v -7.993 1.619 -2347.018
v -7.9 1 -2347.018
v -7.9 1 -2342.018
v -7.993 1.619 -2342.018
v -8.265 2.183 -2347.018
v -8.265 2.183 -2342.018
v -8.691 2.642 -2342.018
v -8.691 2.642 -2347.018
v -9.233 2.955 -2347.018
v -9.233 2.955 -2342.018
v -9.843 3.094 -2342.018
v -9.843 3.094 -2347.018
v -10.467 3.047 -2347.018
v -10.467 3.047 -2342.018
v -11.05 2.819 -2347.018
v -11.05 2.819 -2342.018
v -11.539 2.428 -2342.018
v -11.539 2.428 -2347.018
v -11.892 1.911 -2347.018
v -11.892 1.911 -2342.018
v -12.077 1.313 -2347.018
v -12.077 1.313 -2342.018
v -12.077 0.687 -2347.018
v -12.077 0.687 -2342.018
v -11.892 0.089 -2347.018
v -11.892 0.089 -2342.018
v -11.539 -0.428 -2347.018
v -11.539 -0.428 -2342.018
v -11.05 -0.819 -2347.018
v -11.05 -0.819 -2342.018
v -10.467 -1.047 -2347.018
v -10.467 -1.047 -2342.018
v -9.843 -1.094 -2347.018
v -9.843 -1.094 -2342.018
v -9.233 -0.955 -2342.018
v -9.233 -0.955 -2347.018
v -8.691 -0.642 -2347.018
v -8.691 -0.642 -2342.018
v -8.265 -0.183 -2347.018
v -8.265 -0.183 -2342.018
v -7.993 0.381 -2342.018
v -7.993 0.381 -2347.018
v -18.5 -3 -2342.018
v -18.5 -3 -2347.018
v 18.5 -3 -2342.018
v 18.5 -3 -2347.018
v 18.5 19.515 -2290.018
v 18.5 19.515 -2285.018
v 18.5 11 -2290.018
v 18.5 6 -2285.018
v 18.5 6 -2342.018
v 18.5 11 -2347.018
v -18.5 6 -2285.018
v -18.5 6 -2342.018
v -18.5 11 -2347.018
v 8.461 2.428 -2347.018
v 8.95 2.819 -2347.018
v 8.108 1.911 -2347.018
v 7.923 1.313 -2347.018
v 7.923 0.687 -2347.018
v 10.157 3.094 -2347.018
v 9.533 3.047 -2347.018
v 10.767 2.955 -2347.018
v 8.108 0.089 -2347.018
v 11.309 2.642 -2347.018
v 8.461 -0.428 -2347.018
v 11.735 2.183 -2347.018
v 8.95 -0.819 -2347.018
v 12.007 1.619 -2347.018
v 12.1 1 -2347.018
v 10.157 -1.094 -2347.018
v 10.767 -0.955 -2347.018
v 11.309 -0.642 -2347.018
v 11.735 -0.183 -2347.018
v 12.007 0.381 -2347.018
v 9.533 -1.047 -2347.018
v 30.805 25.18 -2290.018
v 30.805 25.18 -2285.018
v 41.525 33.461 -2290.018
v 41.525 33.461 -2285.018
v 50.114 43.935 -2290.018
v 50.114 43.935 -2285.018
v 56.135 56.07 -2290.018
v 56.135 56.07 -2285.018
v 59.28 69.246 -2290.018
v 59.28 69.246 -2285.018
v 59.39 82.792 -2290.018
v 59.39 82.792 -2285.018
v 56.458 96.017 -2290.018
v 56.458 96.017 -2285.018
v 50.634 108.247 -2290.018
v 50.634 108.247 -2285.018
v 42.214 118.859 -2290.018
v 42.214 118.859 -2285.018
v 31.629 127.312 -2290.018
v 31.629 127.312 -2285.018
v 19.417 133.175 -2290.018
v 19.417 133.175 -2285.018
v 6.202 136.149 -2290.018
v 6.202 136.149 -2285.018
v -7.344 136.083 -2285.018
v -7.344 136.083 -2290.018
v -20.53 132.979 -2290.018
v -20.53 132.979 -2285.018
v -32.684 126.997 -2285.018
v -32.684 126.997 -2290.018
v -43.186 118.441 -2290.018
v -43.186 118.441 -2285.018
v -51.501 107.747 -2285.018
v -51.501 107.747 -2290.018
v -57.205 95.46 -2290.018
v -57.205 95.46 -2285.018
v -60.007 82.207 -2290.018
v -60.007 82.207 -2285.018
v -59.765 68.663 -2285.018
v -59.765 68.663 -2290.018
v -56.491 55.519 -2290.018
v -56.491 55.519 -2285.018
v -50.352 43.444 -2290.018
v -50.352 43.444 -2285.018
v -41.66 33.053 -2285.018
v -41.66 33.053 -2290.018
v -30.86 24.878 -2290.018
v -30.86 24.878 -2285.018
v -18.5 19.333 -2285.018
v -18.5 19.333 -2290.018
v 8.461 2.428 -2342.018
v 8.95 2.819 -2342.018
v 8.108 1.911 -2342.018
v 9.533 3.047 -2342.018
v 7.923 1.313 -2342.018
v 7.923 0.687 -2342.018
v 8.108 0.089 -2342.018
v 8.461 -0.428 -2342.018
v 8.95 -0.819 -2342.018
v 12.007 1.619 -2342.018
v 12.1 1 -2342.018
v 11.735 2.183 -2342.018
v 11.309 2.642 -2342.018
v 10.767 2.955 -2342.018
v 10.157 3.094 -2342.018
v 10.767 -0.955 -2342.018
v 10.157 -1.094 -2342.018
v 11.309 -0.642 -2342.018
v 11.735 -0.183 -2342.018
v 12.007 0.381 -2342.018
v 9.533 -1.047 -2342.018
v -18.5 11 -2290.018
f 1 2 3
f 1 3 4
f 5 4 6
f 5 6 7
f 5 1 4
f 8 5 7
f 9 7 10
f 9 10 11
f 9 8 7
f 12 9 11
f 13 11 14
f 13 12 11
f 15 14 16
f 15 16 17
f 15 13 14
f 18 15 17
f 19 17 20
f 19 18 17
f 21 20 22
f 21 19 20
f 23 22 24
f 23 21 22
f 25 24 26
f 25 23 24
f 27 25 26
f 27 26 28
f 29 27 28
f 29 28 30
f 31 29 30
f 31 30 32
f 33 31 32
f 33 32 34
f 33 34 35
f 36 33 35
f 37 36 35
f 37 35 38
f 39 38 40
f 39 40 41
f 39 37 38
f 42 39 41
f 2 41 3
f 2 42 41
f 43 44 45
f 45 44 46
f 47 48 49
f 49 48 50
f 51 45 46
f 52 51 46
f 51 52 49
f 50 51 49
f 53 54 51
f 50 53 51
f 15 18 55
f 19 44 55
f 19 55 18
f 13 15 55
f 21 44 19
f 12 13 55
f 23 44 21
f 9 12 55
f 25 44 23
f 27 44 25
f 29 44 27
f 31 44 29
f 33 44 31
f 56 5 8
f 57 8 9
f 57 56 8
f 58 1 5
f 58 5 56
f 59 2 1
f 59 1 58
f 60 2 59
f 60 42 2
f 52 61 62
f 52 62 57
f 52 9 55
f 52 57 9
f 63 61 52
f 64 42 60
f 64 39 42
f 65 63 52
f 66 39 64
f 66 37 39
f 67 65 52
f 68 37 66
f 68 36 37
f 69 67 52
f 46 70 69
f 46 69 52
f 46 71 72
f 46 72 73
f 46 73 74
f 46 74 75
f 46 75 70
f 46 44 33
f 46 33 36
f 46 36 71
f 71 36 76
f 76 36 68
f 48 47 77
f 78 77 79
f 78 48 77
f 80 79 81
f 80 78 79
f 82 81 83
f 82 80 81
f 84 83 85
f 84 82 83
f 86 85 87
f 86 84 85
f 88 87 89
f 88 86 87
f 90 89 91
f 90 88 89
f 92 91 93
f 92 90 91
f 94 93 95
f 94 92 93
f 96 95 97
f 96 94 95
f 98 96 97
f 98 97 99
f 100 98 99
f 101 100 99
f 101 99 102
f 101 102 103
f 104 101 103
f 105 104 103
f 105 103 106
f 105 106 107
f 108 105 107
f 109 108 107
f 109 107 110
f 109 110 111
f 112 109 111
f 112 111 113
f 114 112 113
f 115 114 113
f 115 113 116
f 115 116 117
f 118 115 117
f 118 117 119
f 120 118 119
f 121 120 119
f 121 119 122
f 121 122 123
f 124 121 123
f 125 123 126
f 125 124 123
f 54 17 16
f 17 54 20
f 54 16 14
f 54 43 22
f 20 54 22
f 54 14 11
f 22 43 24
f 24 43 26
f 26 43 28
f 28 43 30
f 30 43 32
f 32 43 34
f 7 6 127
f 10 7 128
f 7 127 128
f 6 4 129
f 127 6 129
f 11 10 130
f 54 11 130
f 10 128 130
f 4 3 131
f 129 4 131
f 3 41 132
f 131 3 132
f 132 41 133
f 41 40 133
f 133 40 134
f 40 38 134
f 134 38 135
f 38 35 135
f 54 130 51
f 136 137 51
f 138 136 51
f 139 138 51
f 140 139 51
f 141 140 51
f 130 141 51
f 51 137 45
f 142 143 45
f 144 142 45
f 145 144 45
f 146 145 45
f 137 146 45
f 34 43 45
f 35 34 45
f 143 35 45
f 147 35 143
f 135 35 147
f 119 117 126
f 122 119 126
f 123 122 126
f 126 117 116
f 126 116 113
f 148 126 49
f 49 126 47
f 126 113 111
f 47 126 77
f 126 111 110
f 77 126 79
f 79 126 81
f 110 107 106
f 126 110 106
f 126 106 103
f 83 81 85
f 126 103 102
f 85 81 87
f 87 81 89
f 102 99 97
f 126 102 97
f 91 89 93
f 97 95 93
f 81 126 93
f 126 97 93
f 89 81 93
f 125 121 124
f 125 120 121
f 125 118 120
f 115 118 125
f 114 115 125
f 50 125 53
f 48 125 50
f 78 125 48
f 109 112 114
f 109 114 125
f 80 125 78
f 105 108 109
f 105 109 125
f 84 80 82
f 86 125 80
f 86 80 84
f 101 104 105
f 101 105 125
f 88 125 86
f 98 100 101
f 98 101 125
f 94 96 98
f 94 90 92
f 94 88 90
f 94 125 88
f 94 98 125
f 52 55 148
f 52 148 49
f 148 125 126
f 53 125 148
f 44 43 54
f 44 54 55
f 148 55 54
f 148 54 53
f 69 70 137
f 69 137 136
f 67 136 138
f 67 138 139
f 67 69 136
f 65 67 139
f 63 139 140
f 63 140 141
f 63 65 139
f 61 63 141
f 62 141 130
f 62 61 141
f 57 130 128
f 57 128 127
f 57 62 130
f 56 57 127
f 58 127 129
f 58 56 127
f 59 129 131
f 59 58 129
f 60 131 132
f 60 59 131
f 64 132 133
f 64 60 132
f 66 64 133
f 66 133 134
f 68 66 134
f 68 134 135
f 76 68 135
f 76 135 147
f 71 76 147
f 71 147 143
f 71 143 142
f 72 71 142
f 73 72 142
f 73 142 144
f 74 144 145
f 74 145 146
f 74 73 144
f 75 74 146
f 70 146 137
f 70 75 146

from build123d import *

# Parameters (mm, degrees)
SKETCH2_W           = 37
SKETCH2_H           = 8
SKETCH2_R           = 2.1
BOSS_EXTRUDE1_DEPTH = 5
SKETCH3_W           = 37
SKETCH3_H           = 5
BOSS_EXTRUDE2_DEPTH = 6
SKETCH4_W           = 37
SKETCH4_H           = 5
BOSS_EXTRUDE3_DEPTH = 57
SKETCH5_W           = 37
SKETCH5_H           = 5
BOSS_EXTRUDE4_DEPTH = 27.5
SKETCH6_R           = 60
BOSS_EXTRUDE5_DEPTH = 5


with BuildPart() as part:
    # Sketch2 → Boss-Extrude1 (new body)
    with BuildSketch(Plane.XY.offset(-2347.018325578)):
        with Locations((0, 1)):
            Rectangle(SKETCH2_W, SKETCH2_H)
        with Locations((10, 1)):
            Circle(SKETCH2_R, mode=Mode.SUBTRACT)
        with Locations((-10, 1)):
            Circle(SKETCH2_R, mode=Mode.SUBTRACT)
    extrude(amount=BOSS_EXTRUDE1_DEPTH)

    # Sketch3 → Boss-Extrude2 (add)
    with BuildSketch(Plane(origin=(0, 5, 0), x_dir=(1, 0, 0), z_dir=(0, 1, 0))):
        with Locations((0, 2344.518325578)):
            Rectangle(SKETCH3_W, SKETCH3_H)
    extrude(amount=BOSS_EXTRUDE2_DEPTH)

    # Sketch4 → Boss-Extrude3 (add)
    with BuildSketch(Plane.XY.offset(-2342.018325578)):
        with Locations((0, 8.5)):
            Rectangle(SKETCH4_W, SKETCH4_H)
    extrude(amount=BOSS_EXTRUDE3_DEPTH)

    # Sketch5 → Boss-Extrude4 (add)
    with BuildSketch(Plane(origin=(0, 11, 0), x_dir=(1, 0, 0), z_dir=(0, 1, 0))):
        with Locations((0, 2287.518325578)):
            Rectangle(SKETCH5_W, SKETCH5_H)
    extrude(amount=BOSS_EXTRUDE4_DEPTH)

    # Sketch6 → Boss-Extrude5 (add)
    with BuildSketch(Plane.XY.offset(-2285.018325578)):
        with Locations((-0.279431791, 76.5)):
            Circle(SKETCH6_R)
    extrude(amount=-BOSS_EXTRUDE5_DEPTH)


solid = part.part
